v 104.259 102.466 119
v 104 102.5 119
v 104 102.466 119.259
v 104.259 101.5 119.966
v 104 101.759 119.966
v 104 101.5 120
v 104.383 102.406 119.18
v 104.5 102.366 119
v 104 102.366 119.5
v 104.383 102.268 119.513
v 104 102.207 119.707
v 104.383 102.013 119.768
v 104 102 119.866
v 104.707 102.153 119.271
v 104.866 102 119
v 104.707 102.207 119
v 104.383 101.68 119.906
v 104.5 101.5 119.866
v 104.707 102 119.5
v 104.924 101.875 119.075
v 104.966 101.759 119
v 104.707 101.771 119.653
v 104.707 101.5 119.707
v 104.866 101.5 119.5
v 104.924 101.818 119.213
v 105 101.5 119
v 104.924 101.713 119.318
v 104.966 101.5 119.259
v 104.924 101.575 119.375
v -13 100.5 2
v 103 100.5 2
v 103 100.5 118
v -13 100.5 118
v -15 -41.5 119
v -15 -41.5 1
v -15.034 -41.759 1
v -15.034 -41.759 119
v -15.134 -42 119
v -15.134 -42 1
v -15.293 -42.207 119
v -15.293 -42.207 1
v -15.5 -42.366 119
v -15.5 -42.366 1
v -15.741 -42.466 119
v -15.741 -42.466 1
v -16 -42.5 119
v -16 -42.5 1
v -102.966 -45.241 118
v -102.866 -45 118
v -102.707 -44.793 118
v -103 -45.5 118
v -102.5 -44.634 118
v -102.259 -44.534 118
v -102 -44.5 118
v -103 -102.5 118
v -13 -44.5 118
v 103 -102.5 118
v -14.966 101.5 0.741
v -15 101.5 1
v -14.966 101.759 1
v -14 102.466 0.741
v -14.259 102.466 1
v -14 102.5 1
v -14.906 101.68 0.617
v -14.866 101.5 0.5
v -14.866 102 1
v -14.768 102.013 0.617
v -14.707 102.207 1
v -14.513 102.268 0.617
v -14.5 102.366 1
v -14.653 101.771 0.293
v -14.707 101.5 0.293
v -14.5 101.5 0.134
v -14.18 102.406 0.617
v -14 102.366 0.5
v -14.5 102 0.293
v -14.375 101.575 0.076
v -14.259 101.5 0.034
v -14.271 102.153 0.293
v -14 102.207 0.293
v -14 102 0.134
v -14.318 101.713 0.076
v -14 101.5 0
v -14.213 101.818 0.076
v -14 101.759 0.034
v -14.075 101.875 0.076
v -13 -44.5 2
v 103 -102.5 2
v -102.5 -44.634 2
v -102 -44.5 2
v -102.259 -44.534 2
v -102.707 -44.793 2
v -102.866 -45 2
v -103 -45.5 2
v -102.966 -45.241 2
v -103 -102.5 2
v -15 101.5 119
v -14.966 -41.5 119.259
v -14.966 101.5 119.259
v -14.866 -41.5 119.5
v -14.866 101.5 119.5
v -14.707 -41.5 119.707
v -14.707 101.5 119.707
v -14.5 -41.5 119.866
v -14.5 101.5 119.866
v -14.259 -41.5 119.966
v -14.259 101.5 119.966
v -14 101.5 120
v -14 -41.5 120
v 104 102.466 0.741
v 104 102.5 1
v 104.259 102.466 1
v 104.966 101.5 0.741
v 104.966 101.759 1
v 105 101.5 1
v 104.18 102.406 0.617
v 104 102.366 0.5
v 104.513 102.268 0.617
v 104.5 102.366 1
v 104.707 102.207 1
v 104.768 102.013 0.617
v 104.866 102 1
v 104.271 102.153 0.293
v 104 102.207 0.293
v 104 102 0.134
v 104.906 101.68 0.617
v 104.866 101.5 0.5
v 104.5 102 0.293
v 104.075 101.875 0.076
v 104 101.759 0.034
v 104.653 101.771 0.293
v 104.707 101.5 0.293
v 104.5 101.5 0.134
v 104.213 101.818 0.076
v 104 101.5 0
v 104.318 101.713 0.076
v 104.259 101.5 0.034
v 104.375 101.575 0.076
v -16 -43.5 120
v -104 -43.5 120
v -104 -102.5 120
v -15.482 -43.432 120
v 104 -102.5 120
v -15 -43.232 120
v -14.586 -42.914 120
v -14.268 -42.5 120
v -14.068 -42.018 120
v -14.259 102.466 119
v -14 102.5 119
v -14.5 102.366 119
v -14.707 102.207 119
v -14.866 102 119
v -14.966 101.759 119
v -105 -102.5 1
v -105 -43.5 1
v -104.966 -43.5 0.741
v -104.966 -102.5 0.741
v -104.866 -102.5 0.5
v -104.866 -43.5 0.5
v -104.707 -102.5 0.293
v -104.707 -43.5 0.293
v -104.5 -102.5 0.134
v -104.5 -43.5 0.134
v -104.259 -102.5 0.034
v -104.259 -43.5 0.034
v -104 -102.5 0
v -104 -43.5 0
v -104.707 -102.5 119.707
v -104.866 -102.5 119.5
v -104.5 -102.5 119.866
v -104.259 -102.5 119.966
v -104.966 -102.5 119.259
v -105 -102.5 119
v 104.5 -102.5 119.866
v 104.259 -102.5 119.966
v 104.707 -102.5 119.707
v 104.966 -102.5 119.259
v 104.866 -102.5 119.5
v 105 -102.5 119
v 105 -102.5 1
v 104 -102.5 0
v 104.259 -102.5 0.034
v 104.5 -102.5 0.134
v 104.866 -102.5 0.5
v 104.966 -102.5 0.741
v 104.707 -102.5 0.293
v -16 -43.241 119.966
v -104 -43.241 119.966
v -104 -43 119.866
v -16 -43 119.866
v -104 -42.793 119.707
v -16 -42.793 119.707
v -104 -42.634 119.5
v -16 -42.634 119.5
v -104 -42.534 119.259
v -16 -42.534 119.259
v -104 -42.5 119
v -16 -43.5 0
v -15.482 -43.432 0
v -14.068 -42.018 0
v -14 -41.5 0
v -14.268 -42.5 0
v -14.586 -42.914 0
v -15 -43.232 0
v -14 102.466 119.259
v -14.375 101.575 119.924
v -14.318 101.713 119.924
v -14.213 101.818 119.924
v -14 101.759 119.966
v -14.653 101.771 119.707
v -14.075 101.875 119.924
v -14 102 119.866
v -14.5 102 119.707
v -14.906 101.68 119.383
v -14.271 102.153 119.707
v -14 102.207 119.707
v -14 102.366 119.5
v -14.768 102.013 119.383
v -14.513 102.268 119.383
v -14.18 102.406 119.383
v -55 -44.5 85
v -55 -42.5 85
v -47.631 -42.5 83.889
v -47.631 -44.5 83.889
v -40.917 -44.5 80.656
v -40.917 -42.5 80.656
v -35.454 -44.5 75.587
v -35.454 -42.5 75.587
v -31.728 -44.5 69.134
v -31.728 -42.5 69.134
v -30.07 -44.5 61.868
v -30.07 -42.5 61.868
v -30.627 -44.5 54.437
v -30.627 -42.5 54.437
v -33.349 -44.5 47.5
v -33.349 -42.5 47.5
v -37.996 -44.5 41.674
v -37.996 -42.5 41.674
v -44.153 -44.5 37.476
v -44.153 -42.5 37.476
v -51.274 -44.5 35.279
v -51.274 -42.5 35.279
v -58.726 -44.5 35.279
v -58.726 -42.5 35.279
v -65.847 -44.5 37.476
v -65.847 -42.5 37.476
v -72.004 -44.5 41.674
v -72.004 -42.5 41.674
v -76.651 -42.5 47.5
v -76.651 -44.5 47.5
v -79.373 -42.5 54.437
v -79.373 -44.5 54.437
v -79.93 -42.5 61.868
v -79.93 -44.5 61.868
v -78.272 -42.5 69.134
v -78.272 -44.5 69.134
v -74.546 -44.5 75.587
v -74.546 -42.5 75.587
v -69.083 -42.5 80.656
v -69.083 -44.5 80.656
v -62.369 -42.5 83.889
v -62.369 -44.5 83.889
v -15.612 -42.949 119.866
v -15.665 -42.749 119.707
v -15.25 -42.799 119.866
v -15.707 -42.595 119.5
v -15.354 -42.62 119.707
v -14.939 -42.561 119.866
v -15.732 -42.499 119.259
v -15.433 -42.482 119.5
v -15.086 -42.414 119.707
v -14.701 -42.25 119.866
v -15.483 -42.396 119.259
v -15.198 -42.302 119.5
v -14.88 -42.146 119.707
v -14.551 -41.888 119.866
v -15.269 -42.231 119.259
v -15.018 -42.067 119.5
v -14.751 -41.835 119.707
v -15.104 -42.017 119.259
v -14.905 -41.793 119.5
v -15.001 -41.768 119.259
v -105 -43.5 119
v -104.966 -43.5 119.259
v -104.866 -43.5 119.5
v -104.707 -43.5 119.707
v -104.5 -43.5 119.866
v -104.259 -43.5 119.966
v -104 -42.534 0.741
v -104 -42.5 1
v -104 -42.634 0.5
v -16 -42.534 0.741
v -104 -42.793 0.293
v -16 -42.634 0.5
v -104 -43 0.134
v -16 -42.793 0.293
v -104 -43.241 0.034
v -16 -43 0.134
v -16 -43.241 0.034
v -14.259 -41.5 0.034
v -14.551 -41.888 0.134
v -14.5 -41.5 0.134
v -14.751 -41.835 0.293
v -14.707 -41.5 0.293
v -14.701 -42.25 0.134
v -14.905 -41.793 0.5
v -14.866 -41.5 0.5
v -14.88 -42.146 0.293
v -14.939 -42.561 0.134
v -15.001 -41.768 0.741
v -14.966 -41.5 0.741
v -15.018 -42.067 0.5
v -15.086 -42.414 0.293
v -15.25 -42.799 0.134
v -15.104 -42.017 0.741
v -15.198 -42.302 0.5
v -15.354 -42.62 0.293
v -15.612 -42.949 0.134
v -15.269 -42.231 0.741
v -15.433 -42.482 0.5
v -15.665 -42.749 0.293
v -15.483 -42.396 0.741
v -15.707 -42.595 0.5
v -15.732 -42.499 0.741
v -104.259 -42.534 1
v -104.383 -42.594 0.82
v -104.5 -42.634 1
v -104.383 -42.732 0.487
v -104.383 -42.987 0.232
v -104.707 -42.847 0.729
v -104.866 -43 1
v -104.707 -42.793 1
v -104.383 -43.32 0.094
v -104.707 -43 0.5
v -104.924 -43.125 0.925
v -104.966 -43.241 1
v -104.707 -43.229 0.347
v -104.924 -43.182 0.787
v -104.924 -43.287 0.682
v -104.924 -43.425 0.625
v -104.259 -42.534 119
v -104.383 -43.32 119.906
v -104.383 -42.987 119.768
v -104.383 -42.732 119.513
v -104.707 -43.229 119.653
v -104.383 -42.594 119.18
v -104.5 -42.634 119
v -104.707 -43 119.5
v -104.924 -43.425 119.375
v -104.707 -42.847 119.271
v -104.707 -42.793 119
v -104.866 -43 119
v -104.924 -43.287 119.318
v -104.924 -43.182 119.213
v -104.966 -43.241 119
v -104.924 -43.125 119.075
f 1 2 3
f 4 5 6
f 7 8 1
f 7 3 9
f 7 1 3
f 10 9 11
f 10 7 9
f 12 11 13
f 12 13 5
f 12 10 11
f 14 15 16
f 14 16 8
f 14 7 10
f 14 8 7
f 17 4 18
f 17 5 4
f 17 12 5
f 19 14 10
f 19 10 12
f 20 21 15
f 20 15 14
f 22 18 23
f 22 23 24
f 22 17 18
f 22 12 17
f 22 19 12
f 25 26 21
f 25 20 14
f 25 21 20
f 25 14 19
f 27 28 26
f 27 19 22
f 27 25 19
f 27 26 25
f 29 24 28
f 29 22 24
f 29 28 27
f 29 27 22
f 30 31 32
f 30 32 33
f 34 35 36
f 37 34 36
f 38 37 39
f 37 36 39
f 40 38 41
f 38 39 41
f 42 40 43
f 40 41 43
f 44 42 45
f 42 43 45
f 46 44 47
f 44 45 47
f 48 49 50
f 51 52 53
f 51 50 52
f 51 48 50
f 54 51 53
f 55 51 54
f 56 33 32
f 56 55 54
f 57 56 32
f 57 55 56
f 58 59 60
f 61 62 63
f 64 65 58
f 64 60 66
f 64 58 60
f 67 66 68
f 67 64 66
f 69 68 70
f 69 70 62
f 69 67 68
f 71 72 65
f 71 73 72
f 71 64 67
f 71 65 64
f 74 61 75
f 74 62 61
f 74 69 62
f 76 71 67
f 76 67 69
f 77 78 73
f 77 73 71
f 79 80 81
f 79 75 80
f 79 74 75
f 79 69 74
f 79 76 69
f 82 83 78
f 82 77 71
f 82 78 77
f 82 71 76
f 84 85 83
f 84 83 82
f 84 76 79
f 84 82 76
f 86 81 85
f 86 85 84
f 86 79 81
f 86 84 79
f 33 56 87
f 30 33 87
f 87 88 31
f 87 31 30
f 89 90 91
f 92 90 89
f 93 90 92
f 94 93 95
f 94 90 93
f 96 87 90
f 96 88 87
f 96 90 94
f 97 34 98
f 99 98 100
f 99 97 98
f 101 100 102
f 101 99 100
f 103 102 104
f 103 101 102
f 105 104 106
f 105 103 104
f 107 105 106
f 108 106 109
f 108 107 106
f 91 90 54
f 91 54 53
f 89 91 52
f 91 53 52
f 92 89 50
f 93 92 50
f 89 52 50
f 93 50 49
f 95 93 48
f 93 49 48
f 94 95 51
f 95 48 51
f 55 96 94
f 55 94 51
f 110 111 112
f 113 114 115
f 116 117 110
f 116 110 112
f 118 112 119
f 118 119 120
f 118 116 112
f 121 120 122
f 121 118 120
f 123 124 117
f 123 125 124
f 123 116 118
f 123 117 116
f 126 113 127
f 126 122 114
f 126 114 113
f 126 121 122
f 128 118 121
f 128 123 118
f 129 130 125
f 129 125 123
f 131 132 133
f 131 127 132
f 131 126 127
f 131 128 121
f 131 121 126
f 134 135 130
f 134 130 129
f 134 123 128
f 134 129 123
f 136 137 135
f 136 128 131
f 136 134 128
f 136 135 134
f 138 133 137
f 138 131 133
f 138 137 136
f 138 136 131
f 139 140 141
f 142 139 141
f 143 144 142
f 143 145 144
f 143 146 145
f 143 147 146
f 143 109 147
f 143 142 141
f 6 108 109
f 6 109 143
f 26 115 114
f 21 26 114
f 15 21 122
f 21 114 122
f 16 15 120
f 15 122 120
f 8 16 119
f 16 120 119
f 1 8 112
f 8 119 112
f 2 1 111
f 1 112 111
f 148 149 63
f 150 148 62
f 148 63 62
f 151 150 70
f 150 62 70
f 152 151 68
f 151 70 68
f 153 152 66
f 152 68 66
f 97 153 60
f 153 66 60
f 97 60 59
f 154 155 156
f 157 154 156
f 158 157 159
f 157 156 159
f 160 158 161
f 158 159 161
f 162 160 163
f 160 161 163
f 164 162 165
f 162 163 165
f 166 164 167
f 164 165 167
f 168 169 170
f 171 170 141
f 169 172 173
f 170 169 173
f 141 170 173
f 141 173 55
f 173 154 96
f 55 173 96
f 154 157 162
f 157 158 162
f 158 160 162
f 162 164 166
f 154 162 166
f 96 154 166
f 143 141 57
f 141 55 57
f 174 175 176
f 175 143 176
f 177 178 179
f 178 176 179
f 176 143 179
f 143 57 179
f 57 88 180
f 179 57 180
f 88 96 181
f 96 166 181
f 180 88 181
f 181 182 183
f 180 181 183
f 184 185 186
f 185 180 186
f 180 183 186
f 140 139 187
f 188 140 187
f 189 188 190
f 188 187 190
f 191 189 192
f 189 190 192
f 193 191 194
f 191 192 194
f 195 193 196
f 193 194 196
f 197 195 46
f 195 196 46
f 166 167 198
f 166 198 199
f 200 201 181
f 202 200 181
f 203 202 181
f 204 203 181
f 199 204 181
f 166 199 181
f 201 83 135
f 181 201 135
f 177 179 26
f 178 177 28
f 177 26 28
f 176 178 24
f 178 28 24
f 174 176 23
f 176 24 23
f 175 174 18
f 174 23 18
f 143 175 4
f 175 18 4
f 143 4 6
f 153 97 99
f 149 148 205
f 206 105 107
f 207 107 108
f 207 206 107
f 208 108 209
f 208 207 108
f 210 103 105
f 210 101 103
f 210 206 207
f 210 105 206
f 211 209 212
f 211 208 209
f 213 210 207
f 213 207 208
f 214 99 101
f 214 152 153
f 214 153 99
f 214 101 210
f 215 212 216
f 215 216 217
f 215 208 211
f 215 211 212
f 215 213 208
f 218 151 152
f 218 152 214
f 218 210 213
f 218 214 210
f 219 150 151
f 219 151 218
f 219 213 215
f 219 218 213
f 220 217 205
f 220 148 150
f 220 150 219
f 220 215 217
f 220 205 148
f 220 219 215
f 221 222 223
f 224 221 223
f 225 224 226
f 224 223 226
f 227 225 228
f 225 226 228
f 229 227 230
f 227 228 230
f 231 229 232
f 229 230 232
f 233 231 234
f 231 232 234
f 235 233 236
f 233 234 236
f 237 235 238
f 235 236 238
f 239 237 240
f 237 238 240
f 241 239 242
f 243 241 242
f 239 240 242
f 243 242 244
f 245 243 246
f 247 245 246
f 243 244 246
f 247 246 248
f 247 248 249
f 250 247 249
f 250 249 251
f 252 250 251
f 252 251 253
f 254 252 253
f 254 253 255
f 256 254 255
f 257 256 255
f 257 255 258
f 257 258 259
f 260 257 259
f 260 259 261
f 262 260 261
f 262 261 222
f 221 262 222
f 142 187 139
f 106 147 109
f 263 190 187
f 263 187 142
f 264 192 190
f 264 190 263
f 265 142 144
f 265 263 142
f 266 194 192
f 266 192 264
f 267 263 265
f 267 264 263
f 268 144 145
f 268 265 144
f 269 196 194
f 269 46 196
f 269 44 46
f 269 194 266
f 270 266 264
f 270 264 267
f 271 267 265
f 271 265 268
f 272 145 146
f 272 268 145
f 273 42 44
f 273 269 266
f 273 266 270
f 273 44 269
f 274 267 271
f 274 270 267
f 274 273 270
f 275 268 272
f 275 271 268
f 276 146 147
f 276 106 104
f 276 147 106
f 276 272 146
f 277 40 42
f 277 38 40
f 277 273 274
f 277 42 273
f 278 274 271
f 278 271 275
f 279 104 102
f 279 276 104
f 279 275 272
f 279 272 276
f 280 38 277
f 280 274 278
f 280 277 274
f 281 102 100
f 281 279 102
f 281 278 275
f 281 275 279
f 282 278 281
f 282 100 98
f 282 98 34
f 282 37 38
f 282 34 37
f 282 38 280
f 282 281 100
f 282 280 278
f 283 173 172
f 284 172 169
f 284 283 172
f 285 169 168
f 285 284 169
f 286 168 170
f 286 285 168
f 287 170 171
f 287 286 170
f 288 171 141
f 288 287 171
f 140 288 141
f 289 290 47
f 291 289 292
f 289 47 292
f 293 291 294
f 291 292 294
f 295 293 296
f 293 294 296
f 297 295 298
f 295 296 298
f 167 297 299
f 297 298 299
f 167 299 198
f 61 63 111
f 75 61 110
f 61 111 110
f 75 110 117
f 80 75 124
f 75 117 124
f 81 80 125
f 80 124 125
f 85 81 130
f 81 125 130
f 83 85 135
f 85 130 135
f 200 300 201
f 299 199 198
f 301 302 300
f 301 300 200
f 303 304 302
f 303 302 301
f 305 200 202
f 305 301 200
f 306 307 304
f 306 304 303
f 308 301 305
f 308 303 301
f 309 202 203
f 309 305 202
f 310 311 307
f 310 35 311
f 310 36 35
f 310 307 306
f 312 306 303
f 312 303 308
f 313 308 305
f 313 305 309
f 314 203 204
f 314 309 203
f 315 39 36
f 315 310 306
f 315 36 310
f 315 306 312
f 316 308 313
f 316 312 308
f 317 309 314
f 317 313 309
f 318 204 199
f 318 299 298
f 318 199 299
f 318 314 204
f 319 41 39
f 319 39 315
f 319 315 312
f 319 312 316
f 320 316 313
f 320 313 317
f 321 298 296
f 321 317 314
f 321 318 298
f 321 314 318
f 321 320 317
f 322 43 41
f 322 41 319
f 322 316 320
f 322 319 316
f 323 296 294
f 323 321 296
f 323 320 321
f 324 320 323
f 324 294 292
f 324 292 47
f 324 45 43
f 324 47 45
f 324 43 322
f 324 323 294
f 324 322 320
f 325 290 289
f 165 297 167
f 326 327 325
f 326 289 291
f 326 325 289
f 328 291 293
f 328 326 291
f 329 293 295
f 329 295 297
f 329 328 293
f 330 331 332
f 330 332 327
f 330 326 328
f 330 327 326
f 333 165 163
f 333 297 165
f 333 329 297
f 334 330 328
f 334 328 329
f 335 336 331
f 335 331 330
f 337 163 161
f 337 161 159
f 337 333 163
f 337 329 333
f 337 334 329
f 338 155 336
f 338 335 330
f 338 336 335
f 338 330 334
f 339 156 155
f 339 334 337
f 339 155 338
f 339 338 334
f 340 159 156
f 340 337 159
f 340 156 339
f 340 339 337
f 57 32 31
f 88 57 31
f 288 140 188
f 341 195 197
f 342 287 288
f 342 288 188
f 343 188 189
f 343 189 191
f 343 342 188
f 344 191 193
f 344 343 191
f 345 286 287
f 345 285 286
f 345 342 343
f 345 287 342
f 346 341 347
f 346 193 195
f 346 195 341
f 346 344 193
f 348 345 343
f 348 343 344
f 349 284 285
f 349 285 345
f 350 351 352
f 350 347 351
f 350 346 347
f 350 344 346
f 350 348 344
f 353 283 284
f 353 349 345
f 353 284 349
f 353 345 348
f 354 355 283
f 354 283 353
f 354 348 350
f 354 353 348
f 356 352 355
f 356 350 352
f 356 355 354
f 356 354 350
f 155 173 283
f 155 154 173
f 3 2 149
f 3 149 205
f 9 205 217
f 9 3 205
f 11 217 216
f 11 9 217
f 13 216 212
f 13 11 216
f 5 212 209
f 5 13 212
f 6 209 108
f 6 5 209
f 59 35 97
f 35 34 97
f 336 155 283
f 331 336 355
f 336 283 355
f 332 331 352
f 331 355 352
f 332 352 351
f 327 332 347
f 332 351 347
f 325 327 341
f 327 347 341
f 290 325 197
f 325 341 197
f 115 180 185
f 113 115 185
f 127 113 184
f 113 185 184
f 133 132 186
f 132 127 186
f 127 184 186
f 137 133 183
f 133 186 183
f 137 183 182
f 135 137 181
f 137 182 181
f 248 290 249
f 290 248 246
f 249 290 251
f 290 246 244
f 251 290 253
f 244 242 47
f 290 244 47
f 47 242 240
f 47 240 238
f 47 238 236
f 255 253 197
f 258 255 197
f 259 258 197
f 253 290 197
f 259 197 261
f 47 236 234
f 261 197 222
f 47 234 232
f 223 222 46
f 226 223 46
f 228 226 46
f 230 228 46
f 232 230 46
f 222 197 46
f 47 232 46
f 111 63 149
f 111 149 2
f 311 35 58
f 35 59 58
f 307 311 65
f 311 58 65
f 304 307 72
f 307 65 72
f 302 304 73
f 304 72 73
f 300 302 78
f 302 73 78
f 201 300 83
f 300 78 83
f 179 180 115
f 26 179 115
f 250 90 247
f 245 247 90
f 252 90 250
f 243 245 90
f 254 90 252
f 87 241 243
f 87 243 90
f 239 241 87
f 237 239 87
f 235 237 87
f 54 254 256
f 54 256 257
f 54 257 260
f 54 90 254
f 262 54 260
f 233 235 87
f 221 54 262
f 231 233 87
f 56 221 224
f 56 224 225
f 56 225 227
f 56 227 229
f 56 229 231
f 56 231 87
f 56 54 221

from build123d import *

# Parameters (mm, degrees)
SKETCH1_W           = 210
SKETCH1_H           = 205
BOSS_EXTRUDE1_DEPTH = 120
SKETCH2_W           = 90
SKETCH2_H           = 145
CUT_EXTRUDE1_DEPTH  = 120
SKETCH3_W           = 88
SKETCH3_H           = 116
CUT_EXTRUDE4_DEPTH  = 58
SKETCH6_W           = 116
SKETCH6_H           = 116
CUT_EXTRUDE6_DEPTH  = 203
SKETCH7_W           = 2
SKETCH7_H           = 116
CUT_EXTRUDE7_DEPTH  = 58
FILLET1_R           = 1
FILLET2_R           = 1
FILLET3_R           = 1
SKETCH8_R           = 25
CUT_EXTRUDE8_DEPTH  = 58


with BuildPart() as part:
    # Sketch1 → Boss-Extrude1 (new body)
    with BuildSketch(Plane.XY):
        Rectangle(SKETCH1_W, SKETCH1_H)
    extrude(amount=BOSS_EXTRUDE1_DEPTH)

    # Sketch2 → Cut-Extrude1 (cut)
    with BuildSketch(Plane.XY.offset(120)):
        with Locations((-60, 30)):
            Rectangle(SKETCH2_W, SKETCH2_H)
    extrude(amount=-CUT_EXTRUDE1_DEPTH, mode=Mode.SUBTRACT)

    # Sketch3 → Cut-Extrude4 (cut)
    with BuildSketch(Plane.XZ.offset(102.5)):
        with Locations((-59, 60)):
            Rectangle(SKETCH3_W, SKETCH3_H)
    extrude(amount=-CUT_EXTRUDE4_DEPTH, mode=Mode.SUBTRACT)

    # Sketch6 → Cut-Extrude6 (cut)
    with BuildSketch(Plane(origin=(0, -102.5, 0), x_dir=(-1, 0, 0), z_dir=(0, -1, 0))):
        with Locations((-45, -60)):
            Rectangle(SKETCH6_W, SKETCH6_H)
    extrude(amount=-CUT_EXTRUDE6_DEPTH, mode=Mode.SUBTRACT)

    # Sketch7 → Cut-Extrude7 (cut)
    with BuildSketch(Plane(origin=(0, -102.5, 0), x_dir=(-1, 0, 0), z_dir=(0, -1, 0))):
        with Locations((14, -60)):
            Rectangle(SKETCH7_W, SKETCH7_H)
    extrude(amount=-CUT_EXTRUDE7_DEPTH, mode=Mode.SUBTRACT)

    # Fillet1
    fillet1_edges = [part.edges().sort_by_distance(p)[0] for p in [
        (-105, -72.5, 0),
        (-105, -72.5, 120),
        (-15, 30, 0),
        (-15, 102.5, 60),
        (-60, -42.5, 0),
        (-15, -42.5, 60),
        (-60, -42.5, 120),
        (-15, 30, 120),
        (-103, -44.5, 60),
        (105, 0, 120),
        (45, 102.5, 120),
    ]]
    fillet(fillet1_edges, radius=FILLET1_R)

    # Fillet2
    # the kernel refuses this fillet: 1 mm, written as the material it takes off along each edge
    with BuildSketch(Plane(origin=(-14, 101.5, 1), x_dir=(0, 1, 0), z_dir=(0, 0, -1))) as fillet2_piece_1_section:
        Polygon((0, 0), (FILLET2_R, 0), (FILLET2_R, -FILLET2_R), (0, -FILLET2_R), align=None)
    fillet2_piece_1 = extrude(amount=FILLET2_R, mode=Mode.PRIVATE)
    fillet2_piece_1 = fillet2_piece_1 - Plane(origin=(-14, 101.5, 1), x_dir=(0.7071067811865476, -0.7071067811865475, 0), z_dir=(0, 0, -1)) * Sphere(FILLET2_R, mode=Mode.PRIVATE)
    add(fillet2_piece_1, mode=Mode.SUBTRACT)
    with BuildSketch(Plane(origin=(104, 101.5, 119), x_dir=(0, 1, 0), z_dir=(1, 0, 0))) as fillet2_piece_2_section:
        Polygon((0, 0), (FILLET2_R, 0), (FILLET2_R, FILLET2_R), (0, FILLET2_R), align=None)
    fillet2_piece_2 = extrude(amount=FILLET2_R, mode=Mode.PRIVATE)
    fillet2_piece_2 = fillet2_piece_2 - Plane(origin=(104, 101.5, 119), x_dir=(0, -0.7071067811865475, -0.7071067811865475), z_dir=(1, 0, 0)) * Sphere(FILLET2_R, mode=Mode.PRIVATE)
    add(fillet2_piece_2, mode=Mode.SUBTRACT)
    with BuildSketch(Plane(origin=(104, 101.5, 1), x_dir=(1, 0, 0), z_dir=(0, 0, -1))) as fillet2_piece_3_section:
        Polygon((0, 0), (FILLET2_R, 0), (FILLET2_R, -FILLET2_R), (0, -FILLET2_R), align=None)
    fillet2_piece_3 = extrude(amount=FILLET2_R, mode=Mode.PRIVATE)
    fillet2_piece_3 = fillet2_piece_3 - Plane(origin=(104, 101.5, 1), x_dir=(-0.7071067811865475, -0.7071067811865475, 0), z_dir=(0, 0, -1)) * Sphere(FILLET2_R, mode=Mode.PRIVATE)
    add(fillet2_piece_3, mode=Mode.SUBTRACT)
    with BuildSketch(Plane(origin=(104, 102.5, 0), x_dir=(0, -1, 0), z_dir=(-1, 0, 0))) as fillet2_piece_4:
        with BuildLine():
            CenterArc((FILLET2_R, FILLET2_R), FILLET2_R, 180, 90)
            Line((0, FILLET2_R), (0, 0))
            Line((0, 0), (FILLET2_R, 0))
        make_face()
    extrude(amount=118, mode=Mode.SUBTRACT)
    with BuildSketch(Plane(origin=(105, -105, 0), x_dir=(-1, 0, 0), z_dir=(0, 1, 0))) as fillet2_piece_5:
        with BuildLine():
            CenterArc((FILLET2_R, FILLET2_R), FILLET2_R, 180, 90)
            Line((0, FILLET2_R), (0, 0))
            Line((0, 0), (FILLET2_R, 0))
        make_face()
    extrude(amount=206.5, mode=Mode.SUBTRACT)
    with BuildSketch(Plane(origin=(105, 102.5, 1), x_dir=(0, -1, 0), z_dir=(0, 0, 1))) as fillet2_piece_6:
        with BuildLine():
            CenterArc((FILLET2_R, -FILLET2_R), FILLET2_R, 90, 90)
            Line((0, -FILLET2_R), (0, 0))
            Line((0, 0), (FILLET2_R, 0))
        make_face()
    extrude(amount=118, mode=Mode.SUBTRACT)

    # Fillet3
    # the kernel refuses this fillet: 1 mm, written as the material it takes off along each edge
    with BuildSketch(Plane(origin=(-104, -43.5, 1), x_dir=(0, 1, 0), z_dir=(-1, 0, 0))) as fillet3_piece_1_section:
        Polygon((0, 0), (FILLET3_R, 0), (FILLET3_R, FILLET3_R), (0, FILLET3_R), align=None)
    fillet3_piece_1 = extrude(amount=FILLET3_R, mode=Mode.PRIVATE)
    fillet3_piece_1 = fillet3_piece_1 - Plane(origin=(-104, -43.5, 1), x_dir=(0, -0.7071067811865475, 0.7071067811865475), z_dir=(-1, 0, 0)) * Sphere(FILLET3_R, mode=Mode.PRIVATE)
    add(fillet3_piece_1, mode=Mode.SUBTRACT)
    with BuildSketch(Plane(origin=(-104, -43.5, 119), x_dir=(0, 1, 0), z_dir=(-1, 0, 0))) as fillet3_piece_2_section:
        Polygon((0, 0), (FILLET3_R, 0), (FILLET3_R, -FILLET3_R), (0, -FILLET3_R), align=None)
    fillet3_piece_2 = extrude(amount=FILLET3_R, mode=Mode.PRIVATE)
    fillet3_piece_2 = fillet3_piece_2 - Plane(origin=(-104, -43.5, 119), x_dir=(0, -0.7071067811865475, -0.7071067811865475), z_dir=(-1, 0, 0)) * Sphere(FILLET3_R, mode=Mode.PRIVATE)
    add(fillet3_piece_2, mode=Mode.SUBTRACT)
    with BuildSketch(Plane(origin=(-105, -42.5, 119), x_dir=(0, -1, 0), z_dir=(0, 0, -1))) as fillet3_piece_3:
        with BuildLine():
            CenterArc((FILLET3_R, -FILLET3_R), FILLET3_R, 90, 90)
            Line((0, -FILLET3_R), (0, 0))
            Line((0, 0), (FILLET3_R, 0))
        make_face()
    extrude(amount=118, mode=Mode.SUBTRACT)

    # Sketch8 → Cut-Extrude8 (cut)
    with BuildSketch(Plane(origin=(0, -42.5, 0), x_dir=(1, 0, 0), z_dir=(0, 1, 0))):
        with Locations(Location((-55, -60, 0), (0, 0, 270))):
            Circle(SKETCH8_R)
    extrude(amount=-CUT_EXTRUDE8_DEPTH, mode=Mode.SUBTRACT)


solid = part.part
